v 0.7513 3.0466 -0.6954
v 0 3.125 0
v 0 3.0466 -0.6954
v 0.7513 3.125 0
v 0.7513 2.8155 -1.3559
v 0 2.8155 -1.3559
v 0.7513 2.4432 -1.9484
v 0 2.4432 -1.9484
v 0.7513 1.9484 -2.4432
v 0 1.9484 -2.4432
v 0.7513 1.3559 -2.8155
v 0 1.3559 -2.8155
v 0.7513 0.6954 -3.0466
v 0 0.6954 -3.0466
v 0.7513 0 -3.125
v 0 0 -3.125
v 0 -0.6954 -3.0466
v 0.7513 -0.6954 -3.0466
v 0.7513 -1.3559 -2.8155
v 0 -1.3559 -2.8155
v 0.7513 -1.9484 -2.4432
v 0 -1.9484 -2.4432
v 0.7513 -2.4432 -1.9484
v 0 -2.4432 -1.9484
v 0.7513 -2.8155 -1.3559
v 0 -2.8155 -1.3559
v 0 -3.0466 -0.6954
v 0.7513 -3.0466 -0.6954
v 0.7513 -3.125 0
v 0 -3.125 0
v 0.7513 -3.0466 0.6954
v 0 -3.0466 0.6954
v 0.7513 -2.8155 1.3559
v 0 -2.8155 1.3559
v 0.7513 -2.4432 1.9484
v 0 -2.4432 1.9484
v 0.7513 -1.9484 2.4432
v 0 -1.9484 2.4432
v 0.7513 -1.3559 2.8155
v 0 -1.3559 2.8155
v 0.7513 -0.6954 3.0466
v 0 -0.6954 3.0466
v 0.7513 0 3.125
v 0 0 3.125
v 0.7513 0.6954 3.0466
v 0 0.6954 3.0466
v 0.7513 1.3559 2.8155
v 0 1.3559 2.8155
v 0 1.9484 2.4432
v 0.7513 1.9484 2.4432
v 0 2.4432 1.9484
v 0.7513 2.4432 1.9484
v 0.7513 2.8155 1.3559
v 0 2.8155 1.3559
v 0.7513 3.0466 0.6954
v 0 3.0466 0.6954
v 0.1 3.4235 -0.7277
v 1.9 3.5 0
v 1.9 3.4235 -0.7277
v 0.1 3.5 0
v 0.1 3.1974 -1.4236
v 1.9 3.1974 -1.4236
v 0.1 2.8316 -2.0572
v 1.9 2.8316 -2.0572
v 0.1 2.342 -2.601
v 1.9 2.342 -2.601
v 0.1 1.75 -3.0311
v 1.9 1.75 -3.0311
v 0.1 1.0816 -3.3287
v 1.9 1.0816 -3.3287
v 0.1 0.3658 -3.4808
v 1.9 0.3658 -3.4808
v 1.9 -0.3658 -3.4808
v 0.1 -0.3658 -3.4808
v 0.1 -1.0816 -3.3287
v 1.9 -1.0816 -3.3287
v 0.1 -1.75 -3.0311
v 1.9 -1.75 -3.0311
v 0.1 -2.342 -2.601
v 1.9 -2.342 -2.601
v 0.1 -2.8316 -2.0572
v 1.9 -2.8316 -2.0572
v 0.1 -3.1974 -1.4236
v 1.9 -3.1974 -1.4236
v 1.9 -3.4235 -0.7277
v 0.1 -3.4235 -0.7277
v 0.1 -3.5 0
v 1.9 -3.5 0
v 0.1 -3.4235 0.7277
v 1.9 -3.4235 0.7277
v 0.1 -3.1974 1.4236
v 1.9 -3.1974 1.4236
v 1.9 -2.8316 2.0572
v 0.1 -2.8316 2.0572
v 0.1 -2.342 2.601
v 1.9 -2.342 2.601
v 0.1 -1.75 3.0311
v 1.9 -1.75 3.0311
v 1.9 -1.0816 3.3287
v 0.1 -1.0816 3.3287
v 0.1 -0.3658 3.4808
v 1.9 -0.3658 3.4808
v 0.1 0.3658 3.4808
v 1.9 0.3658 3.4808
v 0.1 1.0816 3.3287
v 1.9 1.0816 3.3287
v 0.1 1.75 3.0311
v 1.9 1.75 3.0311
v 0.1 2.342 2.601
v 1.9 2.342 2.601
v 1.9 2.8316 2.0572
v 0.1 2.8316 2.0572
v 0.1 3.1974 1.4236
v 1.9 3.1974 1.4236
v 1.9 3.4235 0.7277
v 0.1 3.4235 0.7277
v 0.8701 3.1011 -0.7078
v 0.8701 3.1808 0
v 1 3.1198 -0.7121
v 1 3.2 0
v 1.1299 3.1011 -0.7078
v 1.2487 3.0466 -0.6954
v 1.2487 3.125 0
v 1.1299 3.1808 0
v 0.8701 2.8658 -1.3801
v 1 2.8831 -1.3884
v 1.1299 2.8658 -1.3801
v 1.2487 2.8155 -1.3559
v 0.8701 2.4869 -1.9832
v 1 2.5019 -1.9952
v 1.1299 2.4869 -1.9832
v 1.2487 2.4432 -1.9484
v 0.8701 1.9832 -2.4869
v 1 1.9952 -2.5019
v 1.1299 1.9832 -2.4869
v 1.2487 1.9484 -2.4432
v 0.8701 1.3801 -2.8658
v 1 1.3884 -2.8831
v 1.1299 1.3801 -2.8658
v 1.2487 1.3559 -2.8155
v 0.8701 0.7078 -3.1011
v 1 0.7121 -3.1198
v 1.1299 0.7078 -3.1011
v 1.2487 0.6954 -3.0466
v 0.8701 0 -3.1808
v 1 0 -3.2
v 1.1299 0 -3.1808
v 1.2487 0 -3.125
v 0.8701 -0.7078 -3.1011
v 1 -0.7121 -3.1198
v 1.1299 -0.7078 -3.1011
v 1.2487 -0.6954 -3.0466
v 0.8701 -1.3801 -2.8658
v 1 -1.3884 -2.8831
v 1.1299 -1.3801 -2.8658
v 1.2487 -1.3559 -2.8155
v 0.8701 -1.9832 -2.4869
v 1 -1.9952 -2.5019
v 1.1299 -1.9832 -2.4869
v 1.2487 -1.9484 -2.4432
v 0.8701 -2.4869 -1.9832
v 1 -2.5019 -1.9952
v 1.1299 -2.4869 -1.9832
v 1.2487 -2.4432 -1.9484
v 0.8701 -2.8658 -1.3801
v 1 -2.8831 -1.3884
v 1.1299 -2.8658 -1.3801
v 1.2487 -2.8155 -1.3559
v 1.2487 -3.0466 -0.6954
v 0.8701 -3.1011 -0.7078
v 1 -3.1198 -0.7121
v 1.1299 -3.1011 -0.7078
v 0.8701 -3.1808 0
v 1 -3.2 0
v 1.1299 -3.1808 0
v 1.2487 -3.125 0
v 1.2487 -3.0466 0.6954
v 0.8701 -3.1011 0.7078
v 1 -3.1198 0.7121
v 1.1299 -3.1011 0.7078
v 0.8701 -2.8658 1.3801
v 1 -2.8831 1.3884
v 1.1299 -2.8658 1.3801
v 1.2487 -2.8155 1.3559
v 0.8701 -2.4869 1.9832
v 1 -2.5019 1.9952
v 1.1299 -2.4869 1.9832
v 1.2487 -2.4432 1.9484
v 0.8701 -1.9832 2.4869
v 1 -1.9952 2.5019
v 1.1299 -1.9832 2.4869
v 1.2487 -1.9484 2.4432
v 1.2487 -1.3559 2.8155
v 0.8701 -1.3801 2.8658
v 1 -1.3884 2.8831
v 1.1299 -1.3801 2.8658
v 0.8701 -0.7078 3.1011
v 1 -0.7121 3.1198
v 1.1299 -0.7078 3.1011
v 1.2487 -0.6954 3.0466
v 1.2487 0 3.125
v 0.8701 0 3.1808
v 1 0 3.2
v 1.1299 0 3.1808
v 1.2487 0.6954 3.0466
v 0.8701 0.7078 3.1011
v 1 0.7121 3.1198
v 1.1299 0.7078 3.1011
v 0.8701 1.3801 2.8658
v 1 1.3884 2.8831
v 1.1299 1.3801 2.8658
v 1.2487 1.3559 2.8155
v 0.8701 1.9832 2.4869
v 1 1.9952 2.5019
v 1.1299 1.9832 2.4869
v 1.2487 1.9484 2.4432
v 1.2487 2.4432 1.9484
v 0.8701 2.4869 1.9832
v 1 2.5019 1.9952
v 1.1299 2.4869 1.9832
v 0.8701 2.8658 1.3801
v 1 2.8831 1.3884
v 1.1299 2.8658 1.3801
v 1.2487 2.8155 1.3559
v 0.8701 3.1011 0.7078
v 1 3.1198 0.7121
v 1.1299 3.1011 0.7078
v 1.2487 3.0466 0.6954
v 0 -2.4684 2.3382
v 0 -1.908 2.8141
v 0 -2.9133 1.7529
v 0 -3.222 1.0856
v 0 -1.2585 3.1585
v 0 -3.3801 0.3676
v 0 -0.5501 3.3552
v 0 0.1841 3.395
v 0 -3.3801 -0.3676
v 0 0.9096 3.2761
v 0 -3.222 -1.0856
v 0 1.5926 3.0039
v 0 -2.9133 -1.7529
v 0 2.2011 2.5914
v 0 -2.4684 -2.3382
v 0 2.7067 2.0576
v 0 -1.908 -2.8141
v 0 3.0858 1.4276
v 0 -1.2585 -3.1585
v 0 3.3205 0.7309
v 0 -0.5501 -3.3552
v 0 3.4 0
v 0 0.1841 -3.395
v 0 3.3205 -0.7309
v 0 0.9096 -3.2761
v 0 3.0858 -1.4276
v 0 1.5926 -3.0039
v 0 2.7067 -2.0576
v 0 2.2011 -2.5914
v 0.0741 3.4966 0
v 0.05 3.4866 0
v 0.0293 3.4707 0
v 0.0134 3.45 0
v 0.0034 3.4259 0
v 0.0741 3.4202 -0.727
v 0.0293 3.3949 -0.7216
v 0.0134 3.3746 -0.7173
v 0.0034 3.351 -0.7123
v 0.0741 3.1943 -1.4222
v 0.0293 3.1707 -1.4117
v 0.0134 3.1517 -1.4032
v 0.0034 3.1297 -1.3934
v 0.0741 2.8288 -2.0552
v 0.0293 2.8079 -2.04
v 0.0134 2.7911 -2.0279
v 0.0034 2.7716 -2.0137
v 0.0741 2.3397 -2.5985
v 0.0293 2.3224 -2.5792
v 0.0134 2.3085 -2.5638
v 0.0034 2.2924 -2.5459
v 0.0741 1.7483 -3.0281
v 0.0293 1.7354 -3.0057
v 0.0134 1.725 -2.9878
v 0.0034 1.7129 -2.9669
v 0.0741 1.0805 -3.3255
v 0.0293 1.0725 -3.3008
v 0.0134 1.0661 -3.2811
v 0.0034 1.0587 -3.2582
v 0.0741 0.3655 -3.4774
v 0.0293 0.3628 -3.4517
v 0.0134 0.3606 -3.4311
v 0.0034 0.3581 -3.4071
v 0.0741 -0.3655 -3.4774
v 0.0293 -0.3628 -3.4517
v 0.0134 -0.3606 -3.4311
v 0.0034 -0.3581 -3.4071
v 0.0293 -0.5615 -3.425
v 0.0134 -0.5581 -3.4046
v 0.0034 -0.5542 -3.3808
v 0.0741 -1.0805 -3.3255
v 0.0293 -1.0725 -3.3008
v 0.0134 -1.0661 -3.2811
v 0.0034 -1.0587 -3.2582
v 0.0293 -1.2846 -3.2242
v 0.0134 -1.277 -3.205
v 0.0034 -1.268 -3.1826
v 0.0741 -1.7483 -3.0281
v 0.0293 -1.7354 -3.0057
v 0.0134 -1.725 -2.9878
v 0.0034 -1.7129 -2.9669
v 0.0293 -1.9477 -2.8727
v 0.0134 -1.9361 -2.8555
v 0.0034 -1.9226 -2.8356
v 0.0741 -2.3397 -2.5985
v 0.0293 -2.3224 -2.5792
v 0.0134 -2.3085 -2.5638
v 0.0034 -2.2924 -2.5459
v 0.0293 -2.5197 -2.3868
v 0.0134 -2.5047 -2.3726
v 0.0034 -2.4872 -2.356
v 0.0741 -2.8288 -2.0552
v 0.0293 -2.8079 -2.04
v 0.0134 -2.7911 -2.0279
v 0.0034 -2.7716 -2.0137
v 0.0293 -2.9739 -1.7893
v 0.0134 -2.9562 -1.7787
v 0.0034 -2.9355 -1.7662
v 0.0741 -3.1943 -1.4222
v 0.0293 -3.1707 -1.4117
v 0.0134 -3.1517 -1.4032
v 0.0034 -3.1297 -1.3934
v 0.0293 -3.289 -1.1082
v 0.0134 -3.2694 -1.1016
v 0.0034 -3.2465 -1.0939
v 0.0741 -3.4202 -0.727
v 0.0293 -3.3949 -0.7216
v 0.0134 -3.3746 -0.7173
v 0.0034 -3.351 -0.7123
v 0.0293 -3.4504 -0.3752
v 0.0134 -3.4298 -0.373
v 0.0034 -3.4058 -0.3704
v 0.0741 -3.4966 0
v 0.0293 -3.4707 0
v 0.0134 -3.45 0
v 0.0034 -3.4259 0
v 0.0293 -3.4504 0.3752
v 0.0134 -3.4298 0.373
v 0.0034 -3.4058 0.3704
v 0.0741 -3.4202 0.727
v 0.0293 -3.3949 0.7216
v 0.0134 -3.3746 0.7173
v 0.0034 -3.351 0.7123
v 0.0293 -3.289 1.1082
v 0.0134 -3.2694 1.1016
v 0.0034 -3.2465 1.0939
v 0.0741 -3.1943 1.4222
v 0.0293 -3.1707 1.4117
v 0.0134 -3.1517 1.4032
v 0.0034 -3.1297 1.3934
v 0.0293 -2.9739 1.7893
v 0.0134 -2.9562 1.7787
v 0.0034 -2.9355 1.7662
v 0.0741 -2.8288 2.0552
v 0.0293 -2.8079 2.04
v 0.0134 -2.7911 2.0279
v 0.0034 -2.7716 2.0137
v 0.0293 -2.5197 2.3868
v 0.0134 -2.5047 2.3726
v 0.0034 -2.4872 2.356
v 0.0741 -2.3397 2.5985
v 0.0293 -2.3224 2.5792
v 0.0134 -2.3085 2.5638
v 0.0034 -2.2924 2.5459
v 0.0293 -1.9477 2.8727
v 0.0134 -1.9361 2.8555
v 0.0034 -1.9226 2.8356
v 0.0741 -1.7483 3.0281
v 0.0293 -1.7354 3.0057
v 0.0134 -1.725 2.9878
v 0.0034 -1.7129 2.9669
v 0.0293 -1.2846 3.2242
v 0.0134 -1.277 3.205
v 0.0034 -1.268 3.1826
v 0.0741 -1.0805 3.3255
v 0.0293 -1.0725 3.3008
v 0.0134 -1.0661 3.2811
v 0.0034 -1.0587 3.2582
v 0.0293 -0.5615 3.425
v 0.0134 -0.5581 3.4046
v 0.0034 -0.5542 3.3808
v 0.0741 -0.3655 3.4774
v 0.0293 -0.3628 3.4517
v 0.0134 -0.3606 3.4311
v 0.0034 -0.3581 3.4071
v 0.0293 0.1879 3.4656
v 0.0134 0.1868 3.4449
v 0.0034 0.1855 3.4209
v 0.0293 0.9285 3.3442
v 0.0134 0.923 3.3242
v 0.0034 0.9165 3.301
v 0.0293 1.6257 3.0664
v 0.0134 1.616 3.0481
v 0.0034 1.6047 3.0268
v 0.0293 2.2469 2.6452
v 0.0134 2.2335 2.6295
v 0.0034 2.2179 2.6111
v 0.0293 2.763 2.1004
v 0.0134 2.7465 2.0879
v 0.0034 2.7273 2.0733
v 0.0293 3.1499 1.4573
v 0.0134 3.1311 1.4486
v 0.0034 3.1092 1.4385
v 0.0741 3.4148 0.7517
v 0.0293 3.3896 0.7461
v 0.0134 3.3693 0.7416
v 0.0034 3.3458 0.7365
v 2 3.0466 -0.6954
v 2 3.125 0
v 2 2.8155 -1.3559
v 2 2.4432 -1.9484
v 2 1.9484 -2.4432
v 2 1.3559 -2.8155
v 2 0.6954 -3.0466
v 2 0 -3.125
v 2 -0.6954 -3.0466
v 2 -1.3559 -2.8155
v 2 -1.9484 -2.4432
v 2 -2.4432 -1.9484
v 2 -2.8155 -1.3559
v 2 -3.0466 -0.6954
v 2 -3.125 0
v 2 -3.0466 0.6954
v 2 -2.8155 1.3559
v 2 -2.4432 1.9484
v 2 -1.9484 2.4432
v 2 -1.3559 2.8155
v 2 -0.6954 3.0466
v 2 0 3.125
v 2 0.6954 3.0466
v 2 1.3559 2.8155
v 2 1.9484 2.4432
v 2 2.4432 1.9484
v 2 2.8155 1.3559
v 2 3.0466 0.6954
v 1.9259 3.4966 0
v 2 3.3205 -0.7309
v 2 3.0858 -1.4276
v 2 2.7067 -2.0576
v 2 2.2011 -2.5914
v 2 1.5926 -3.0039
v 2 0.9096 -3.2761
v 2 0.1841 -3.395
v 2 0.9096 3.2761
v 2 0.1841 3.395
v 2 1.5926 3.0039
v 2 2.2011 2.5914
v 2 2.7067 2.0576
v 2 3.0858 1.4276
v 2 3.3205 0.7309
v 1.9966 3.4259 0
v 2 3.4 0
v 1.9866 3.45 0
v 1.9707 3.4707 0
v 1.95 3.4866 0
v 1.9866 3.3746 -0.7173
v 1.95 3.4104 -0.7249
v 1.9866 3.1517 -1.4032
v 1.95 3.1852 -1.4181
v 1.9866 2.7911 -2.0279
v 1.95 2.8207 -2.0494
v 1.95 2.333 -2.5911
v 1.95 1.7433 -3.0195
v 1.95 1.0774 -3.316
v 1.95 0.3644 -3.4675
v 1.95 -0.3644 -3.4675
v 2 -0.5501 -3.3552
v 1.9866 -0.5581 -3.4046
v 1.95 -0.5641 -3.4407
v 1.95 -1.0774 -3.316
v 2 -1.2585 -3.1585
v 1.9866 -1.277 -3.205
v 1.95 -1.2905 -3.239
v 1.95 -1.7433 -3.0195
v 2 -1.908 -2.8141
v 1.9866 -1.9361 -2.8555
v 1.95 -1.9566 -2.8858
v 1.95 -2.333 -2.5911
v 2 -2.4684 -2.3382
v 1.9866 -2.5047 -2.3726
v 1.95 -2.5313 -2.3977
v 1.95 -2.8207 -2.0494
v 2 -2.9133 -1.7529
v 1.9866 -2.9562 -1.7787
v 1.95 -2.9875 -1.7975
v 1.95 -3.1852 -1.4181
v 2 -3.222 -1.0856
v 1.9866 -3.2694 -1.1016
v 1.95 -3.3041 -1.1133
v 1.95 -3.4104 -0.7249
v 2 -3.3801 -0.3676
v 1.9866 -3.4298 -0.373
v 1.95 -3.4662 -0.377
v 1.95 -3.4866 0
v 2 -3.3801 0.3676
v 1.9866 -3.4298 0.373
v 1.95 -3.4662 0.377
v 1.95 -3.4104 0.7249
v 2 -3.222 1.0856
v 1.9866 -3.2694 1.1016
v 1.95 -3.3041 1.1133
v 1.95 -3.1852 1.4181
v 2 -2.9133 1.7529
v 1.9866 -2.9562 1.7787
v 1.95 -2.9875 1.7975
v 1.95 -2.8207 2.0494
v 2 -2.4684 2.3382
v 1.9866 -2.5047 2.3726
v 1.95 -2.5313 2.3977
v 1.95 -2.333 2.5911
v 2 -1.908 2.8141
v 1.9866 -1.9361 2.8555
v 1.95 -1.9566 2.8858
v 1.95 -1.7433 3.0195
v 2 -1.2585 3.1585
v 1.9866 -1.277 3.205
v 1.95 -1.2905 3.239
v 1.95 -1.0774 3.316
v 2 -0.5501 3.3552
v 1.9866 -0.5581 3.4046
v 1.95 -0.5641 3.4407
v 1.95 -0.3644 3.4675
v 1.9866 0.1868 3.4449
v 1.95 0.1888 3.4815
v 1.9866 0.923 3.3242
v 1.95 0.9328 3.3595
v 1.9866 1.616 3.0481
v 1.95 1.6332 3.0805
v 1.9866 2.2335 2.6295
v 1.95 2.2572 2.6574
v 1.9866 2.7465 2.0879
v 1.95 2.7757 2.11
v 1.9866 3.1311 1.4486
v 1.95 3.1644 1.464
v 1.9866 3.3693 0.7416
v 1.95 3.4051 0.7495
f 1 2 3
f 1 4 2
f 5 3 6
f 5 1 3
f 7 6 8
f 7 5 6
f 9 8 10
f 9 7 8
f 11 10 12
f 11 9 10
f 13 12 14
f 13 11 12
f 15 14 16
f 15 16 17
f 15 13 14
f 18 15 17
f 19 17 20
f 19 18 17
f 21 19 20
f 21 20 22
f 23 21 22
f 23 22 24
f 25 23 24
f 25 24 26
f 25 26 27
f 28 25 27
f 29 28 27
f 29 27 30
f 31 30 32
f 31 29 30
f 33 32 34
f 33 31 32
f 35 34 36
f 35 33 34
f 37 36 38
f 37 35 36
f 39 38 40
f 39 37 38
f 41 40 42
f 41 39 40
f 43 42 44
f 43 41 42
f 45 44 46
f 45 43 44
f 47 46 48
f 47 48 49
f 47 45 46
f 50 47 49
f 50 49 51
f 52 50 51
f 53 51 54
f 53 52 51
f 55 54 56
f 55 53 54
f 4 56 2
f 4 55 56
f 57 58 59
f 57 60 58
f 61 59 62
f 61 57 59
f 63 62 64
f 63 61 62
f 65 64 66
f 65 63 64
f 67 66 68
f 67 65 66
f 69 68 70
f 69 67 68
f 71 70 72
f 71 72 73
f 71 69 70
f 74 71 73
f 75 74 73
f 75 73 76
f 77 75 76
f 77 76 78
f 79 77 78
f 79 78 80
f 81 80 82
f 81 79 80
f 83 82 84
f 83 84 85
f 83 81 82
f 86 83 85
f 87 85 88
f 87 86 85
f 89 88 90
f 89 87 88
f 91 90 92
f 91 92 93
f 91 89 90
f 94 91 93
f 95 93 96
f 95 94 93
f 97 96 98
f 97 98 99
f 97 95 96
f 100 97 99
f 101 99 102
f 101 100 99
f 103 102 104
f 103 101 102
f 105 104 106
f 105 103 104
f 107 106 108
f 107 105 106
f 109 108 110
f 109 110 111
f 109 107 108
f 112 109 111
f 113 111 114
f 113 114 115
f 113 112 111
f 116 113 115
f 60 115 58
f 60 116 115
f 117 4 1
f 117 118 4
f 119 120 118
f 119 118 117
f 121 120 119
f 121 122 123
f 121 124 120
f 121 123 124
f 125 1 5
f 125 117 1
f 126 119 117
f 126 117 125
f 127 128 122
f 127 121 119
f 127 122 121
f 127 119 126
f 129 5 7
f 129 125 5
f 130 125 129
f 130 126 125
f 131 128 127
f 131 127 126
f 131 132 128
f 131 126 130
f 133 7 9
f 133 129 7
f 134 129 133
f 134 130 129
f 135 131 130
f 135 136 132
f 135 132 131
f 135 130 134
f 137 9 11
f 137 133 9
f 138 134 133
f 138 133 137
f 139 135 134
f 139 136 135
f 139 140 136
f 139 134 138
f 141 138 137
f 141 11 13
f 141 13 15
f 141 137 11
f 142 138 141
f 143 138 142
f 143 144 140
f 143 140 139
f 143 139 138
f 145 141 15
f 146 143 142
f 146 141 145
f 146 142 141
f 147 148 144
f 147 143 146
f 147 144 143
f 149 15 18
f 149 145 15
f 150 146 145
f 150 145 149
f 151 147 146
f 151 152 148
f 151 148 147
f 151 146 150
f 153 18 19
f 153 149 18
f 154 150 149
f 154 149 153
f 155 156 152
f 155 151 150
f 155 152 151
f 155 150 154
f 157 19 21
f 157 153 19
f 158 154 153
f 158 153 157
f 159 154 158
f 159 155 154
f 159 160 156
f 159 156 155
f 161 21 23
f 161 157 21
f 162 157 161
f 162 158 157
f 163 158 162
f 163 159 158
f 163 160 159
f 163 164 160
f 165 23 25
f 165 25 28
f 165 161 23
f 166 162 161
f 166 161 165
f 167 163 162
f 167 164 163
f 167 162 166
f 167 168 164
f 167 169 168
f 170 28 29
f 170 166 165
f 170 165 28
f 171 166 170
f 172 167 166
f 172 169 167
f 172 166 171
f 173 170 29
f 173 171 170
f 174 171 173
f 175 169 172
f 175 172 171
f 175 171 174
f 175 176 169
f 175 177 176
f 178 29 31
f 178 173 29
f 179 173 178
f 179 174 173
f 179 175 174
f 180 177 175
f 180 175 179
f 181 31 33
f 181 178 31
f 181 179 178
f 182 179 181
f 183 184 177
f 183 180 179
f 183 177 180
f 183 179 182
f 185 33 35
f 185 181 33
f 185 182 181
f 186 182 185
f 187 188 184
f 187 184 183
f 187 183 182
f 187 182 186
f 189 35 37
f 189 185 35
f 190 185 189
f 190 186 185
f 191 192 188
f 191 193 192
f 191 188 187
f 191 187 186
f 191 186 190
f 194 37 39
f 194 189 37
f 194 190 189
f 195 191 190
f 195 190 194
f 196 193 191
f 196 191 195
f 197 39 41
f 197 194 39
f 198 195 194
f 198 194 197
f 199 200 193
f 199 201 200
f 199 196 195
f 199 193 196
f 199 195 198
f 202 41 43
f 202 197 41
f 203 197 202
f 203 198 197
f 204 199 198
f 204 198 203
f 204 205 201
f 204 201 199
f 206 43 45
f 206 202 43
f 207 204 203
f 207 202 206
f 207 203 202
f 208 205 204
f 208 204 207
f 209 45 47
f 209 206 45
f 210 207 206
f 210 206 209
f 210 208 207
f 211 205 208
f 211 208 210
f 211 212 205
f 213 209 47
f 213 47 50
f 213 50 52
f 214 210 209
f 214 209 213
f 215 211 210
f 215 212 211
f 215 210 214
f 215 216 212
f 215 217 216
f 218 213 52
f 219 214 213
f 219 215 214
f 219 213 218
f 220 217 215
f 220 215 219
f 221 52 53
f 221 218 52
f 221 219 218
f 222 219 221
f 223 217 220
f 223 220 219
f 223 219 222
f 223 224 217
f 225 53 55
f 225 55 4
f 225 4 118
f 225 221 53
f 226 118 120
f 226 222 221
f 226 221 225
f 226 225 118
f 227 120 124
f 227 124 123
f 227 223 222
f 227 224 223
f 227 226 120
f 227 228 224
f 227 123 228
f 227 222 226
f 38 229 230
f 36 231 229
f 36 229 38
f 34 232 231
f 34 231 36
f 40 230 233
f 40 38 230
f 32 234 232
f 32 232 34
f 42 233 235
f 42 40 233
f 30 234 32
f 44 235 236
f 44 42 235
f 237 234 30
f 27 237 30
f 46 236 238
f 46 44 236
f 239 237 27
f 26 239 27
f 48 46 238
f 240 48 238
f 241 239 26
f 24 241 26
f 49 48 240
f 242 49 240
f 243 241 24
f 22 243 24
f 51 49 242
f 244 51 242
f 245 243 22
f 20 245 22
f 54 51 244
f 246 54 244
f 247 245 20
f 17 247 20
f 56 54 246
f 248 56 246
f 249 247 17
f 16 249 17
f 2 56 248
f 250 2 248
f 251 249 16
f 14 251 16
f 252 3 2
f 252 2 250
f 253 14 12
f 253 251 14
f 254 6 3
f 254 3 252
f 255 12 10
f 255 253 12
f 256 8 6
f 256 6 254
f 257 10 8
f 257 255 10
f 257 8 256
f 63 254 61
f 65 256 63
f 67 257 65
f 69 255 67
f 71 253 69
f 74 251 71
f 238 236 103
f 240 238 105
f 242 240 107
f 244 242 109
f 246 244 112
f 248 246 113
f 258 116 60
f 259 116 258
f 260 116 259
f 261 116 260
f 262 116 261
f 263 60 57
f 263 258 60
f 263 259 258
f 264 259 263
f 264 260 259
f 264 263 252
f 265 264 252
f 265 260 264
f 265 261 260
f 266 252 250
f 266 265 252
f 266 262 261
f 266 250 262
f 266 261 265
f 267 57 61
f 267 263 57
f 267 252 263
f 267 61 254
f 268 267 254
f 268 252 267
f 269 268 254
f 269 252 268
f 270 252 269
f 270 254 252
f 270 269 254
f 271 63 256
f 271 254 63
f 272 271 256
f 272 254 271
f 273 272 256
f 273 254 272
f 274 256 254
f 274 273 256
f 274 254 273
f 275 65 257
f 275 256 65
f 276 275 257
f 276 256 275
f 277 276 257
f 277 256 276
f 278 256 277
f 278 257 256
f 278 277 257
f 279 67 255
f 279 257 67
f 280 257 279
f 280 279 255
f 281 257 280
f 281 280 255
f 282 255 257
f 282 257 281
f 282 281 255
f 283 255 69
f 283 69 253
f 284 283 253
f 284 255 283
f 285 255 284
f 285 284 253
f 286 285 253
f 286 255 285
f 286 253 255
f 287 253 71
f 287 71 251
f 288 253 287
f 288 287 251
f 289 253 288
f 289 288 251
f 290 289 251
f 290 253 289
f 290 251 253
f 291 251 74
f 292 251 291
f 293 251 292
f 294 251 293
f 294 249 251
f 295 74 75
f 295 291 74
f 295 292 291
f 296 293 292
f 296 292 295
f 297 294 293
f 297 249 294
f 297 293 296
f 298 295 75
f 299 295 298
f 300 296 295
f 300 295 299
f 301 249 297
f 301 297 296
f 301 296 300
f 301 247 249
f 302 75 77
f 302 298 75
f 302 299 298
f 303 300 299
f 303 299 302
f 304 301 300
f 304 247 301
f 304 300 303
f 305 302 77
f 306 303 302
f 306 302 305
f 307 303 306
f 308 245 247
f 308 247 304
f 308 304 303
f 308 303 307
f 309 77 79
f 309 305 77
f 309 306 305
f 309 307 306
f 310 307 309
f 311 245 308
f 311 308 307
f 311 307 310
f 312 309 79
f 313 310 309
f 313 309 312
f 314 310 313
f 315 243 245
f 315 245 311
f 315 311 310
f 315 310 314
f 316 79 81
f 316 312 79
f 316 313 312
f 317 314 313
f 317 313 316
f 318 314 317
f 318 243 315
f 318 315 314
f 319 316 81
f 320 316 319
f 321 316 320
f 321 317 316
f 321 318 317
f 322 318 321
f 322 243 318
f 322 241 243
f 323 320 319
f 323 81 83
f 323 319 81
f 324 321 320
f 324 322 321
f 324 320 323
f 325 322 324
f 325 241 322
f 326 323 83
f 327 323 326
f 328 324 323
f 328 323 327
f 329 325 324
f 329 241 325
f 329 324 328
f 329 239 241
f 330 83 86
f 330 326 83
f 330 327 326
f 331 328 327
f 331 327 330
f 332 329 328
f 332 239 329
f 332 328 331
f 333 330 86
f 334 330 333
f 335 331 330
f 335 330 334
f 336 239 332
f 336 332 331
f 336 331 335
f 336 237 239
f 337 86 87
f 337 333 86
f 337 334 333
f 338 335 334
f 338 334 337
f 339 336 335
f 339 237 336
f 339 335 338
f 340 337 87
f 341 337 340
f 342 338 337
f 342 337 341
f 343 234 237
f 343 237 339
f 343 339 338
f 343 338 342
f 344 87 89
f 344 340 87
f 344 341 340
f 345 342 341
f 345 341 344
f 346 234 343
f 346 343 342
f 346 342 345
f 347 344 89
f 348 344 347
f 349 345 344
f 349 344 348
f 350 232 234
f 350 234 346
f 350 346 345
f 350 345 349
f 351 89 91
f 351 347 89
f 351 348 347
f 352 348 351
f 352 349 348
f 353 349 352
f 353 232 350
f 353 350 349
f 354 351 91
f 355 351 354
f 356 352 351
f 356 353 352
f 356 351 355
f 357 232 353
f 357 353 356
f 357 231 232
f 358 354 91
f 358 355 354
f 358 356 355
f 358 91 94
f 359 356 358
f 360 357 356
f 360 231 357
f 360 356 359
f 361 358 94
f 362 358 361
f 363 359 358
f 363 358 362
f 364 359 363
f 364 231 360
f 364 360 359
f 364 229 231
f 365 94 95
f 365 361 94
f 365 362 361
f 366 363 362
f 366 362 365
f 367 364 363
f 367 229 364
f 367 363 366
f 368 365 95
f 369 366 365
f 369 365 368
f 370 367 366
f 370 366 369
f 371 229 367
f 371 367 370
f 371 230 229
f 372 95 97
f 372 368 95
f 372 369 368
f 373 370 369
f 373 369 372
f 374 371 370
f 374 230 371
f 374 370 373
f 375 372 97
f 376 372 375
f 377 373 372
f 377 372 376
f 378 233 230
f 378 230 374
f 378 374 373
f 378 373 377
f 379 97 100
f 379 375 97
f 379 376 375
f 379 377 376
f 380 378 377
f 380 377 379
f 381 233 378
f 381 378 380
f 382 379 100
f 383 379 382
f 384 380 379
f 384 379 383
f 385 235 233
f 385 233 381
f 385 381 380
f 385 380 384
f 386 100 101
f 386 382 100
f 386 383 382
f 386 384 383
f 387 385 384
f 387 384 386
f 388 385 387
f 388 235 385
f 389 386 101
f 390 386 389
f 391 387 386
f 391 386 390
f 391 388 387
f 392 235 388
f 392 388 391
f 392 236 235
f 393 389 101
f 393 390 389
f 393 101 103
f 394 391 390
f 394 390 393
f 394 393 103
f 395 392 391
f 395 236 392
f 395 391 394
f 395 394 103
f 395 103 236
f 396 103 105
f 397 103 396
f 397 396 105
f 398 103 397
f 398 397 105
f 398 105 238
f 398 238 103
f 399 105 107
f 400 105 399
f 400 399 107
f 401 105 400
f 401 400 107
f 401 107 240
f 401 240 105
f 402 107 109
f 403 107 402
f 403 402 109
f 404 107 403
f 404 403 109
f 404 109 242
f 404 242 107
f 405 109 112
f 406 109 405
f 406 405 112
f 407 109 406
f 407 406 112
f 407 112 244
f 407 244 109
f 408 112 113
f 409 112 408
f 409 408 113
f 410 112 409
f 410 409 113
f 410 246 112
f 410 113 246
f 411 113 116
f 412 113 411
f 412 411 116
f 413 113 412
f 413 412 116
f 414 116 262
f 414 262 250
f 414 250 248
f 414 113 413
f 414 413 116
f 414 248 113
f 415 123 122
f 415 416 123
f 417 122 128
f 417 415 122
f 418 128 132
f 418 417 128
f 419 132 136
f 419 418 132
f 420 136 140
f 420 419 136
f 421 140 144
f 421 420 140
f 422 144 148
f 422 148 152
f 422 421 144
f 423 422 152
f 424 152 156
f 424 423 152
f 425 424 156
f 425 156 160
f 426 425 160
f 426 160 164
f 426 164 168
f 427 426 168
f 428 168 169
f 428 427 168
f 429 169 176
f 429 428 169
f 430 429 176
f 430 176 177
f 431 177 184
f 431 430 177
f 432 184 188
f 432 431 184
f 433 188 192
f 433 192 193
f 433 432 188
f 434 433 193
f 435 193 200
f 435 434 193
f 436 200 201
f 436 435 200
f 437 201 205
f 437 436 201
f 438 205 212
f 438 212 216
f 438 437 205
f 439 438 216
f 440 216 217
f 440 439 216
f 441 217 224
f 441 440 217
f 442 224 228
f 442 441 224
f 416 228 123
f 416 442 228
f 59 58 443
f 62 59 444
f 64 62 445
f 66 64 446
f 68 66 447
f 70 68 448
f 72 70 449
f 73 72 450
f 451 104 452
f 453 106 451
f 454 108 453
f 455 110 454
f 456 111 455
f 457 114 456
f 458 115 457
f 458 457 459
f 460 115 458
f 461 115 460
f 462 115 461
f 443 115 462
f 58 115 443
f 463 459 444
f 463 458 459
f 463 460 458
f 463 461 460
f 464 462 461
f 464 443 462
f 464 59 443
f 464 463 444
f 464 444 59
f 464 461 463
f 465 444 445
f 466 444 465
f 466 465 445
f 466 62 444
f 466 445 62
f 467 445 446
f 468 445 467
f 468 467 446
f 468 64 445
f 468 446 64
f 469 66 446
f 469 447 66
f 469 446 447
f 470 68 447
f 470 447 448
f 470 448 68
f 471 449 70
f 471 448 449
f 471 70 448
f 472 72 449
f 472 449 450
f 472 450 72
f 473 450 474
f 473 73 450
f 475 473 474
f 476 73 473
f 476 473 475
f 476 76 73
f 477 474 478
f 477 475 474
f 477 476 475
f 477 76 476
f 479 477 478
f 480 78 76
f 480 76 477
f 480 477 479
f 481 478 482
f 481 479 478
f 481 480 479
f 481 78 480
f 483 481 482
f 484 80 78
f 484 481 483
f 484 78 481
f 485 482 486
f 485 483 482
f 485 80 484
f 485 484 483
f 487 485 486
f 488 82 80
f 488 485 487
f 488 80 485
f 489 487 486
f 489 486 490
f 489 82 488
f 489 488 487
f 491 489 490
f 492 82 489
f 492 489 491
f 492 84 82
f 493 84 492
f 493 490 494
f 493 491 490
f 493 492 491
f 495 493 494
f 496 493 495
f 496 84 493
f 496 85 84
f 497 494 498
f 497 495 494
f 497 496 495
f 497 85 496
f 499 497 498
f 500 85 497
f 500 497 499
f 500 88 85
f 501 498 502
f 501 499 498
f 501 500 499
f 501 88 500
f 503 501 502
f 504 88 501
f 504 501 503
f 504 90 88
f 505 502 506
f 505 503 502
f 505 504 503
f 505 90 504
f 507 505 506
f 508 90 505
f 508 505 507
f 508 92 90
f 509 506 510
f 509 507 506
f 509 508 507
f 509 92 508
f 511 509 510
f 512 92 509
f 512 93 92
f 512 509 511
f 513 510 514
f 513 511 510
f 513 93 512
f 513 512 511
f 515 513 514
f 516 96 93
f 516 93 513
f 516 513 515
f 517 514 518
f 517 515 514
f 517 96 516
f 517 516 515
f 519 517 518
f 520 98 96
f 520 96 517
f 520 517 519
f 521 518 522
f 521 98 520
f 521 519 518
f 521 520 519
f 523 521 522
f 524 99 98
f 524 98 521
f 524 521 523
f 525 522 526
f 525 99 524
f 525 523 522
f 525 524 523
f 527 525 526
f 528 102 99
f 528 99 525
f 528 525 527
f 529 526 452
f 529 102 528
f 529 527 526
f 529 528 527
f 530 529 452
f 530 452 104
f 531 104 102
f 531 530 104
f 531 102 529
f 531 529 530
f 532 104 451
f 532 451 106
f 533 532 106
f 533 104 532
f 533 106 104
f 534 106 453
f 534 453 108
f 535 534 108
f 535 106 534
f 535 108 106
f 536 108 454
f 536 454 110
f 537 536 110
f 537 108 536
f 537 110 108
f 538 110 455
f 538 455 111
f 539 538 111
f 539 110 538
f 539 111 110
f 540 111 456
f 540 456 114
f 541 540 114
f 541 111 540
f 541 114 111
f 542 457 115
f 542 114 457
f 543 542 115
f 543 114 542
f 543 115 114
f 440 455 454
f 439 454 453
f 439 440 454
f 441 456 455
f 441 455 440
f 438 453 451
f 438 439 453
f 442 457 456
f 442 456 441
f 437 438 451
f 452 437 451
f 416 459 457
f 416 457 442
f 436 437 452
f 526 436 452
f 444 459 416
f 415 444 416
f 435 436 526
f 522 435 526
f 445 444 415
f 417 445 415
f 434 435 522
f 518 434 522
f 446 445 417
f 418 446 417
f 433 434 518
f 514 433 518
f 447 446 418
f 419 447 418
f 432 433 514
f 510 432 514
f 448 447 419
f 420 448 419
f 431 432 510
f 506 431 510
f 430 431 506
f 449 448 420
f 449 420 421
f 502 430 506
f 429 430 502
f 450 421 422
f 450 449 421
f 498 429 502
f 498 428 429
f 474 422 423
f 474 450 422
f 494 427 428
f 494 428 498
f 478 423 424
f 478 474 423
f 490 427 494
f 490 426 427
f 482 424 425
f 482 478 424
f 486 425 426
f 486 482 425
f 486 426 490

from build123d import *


with BuildPart() as part:
    # Sketch1 → Revolve1 (revolve)
    with BuildSketch(Plane.XY):
        with BuildLine():
            Line((0, 3.4), (0, 3.125))
            Line((0, 3.125), (0.751253141, 3.125))
            ThreePointArc((0.751253141, 3.125), (1, 3.2), (1.248746859, 3.125))
            Line((1.248746859, 3.125), (2, 3.125))
            Line((2, 3.125), (2, 3.4))
            ThreePointArc((2, 3.4), (1.970710678, 3.470710678), (1.9, 3.5))
            Line((1.9, 3.5), (0.1, 3.5))
            ThreePointArc((0.1, 3.5), (0.029289322, 3.470710678), (0, 3.4))
        make_face()
    revolve(axis=Axis((2, 0, 0), (-1, 0, 0)))


solid = part.part
